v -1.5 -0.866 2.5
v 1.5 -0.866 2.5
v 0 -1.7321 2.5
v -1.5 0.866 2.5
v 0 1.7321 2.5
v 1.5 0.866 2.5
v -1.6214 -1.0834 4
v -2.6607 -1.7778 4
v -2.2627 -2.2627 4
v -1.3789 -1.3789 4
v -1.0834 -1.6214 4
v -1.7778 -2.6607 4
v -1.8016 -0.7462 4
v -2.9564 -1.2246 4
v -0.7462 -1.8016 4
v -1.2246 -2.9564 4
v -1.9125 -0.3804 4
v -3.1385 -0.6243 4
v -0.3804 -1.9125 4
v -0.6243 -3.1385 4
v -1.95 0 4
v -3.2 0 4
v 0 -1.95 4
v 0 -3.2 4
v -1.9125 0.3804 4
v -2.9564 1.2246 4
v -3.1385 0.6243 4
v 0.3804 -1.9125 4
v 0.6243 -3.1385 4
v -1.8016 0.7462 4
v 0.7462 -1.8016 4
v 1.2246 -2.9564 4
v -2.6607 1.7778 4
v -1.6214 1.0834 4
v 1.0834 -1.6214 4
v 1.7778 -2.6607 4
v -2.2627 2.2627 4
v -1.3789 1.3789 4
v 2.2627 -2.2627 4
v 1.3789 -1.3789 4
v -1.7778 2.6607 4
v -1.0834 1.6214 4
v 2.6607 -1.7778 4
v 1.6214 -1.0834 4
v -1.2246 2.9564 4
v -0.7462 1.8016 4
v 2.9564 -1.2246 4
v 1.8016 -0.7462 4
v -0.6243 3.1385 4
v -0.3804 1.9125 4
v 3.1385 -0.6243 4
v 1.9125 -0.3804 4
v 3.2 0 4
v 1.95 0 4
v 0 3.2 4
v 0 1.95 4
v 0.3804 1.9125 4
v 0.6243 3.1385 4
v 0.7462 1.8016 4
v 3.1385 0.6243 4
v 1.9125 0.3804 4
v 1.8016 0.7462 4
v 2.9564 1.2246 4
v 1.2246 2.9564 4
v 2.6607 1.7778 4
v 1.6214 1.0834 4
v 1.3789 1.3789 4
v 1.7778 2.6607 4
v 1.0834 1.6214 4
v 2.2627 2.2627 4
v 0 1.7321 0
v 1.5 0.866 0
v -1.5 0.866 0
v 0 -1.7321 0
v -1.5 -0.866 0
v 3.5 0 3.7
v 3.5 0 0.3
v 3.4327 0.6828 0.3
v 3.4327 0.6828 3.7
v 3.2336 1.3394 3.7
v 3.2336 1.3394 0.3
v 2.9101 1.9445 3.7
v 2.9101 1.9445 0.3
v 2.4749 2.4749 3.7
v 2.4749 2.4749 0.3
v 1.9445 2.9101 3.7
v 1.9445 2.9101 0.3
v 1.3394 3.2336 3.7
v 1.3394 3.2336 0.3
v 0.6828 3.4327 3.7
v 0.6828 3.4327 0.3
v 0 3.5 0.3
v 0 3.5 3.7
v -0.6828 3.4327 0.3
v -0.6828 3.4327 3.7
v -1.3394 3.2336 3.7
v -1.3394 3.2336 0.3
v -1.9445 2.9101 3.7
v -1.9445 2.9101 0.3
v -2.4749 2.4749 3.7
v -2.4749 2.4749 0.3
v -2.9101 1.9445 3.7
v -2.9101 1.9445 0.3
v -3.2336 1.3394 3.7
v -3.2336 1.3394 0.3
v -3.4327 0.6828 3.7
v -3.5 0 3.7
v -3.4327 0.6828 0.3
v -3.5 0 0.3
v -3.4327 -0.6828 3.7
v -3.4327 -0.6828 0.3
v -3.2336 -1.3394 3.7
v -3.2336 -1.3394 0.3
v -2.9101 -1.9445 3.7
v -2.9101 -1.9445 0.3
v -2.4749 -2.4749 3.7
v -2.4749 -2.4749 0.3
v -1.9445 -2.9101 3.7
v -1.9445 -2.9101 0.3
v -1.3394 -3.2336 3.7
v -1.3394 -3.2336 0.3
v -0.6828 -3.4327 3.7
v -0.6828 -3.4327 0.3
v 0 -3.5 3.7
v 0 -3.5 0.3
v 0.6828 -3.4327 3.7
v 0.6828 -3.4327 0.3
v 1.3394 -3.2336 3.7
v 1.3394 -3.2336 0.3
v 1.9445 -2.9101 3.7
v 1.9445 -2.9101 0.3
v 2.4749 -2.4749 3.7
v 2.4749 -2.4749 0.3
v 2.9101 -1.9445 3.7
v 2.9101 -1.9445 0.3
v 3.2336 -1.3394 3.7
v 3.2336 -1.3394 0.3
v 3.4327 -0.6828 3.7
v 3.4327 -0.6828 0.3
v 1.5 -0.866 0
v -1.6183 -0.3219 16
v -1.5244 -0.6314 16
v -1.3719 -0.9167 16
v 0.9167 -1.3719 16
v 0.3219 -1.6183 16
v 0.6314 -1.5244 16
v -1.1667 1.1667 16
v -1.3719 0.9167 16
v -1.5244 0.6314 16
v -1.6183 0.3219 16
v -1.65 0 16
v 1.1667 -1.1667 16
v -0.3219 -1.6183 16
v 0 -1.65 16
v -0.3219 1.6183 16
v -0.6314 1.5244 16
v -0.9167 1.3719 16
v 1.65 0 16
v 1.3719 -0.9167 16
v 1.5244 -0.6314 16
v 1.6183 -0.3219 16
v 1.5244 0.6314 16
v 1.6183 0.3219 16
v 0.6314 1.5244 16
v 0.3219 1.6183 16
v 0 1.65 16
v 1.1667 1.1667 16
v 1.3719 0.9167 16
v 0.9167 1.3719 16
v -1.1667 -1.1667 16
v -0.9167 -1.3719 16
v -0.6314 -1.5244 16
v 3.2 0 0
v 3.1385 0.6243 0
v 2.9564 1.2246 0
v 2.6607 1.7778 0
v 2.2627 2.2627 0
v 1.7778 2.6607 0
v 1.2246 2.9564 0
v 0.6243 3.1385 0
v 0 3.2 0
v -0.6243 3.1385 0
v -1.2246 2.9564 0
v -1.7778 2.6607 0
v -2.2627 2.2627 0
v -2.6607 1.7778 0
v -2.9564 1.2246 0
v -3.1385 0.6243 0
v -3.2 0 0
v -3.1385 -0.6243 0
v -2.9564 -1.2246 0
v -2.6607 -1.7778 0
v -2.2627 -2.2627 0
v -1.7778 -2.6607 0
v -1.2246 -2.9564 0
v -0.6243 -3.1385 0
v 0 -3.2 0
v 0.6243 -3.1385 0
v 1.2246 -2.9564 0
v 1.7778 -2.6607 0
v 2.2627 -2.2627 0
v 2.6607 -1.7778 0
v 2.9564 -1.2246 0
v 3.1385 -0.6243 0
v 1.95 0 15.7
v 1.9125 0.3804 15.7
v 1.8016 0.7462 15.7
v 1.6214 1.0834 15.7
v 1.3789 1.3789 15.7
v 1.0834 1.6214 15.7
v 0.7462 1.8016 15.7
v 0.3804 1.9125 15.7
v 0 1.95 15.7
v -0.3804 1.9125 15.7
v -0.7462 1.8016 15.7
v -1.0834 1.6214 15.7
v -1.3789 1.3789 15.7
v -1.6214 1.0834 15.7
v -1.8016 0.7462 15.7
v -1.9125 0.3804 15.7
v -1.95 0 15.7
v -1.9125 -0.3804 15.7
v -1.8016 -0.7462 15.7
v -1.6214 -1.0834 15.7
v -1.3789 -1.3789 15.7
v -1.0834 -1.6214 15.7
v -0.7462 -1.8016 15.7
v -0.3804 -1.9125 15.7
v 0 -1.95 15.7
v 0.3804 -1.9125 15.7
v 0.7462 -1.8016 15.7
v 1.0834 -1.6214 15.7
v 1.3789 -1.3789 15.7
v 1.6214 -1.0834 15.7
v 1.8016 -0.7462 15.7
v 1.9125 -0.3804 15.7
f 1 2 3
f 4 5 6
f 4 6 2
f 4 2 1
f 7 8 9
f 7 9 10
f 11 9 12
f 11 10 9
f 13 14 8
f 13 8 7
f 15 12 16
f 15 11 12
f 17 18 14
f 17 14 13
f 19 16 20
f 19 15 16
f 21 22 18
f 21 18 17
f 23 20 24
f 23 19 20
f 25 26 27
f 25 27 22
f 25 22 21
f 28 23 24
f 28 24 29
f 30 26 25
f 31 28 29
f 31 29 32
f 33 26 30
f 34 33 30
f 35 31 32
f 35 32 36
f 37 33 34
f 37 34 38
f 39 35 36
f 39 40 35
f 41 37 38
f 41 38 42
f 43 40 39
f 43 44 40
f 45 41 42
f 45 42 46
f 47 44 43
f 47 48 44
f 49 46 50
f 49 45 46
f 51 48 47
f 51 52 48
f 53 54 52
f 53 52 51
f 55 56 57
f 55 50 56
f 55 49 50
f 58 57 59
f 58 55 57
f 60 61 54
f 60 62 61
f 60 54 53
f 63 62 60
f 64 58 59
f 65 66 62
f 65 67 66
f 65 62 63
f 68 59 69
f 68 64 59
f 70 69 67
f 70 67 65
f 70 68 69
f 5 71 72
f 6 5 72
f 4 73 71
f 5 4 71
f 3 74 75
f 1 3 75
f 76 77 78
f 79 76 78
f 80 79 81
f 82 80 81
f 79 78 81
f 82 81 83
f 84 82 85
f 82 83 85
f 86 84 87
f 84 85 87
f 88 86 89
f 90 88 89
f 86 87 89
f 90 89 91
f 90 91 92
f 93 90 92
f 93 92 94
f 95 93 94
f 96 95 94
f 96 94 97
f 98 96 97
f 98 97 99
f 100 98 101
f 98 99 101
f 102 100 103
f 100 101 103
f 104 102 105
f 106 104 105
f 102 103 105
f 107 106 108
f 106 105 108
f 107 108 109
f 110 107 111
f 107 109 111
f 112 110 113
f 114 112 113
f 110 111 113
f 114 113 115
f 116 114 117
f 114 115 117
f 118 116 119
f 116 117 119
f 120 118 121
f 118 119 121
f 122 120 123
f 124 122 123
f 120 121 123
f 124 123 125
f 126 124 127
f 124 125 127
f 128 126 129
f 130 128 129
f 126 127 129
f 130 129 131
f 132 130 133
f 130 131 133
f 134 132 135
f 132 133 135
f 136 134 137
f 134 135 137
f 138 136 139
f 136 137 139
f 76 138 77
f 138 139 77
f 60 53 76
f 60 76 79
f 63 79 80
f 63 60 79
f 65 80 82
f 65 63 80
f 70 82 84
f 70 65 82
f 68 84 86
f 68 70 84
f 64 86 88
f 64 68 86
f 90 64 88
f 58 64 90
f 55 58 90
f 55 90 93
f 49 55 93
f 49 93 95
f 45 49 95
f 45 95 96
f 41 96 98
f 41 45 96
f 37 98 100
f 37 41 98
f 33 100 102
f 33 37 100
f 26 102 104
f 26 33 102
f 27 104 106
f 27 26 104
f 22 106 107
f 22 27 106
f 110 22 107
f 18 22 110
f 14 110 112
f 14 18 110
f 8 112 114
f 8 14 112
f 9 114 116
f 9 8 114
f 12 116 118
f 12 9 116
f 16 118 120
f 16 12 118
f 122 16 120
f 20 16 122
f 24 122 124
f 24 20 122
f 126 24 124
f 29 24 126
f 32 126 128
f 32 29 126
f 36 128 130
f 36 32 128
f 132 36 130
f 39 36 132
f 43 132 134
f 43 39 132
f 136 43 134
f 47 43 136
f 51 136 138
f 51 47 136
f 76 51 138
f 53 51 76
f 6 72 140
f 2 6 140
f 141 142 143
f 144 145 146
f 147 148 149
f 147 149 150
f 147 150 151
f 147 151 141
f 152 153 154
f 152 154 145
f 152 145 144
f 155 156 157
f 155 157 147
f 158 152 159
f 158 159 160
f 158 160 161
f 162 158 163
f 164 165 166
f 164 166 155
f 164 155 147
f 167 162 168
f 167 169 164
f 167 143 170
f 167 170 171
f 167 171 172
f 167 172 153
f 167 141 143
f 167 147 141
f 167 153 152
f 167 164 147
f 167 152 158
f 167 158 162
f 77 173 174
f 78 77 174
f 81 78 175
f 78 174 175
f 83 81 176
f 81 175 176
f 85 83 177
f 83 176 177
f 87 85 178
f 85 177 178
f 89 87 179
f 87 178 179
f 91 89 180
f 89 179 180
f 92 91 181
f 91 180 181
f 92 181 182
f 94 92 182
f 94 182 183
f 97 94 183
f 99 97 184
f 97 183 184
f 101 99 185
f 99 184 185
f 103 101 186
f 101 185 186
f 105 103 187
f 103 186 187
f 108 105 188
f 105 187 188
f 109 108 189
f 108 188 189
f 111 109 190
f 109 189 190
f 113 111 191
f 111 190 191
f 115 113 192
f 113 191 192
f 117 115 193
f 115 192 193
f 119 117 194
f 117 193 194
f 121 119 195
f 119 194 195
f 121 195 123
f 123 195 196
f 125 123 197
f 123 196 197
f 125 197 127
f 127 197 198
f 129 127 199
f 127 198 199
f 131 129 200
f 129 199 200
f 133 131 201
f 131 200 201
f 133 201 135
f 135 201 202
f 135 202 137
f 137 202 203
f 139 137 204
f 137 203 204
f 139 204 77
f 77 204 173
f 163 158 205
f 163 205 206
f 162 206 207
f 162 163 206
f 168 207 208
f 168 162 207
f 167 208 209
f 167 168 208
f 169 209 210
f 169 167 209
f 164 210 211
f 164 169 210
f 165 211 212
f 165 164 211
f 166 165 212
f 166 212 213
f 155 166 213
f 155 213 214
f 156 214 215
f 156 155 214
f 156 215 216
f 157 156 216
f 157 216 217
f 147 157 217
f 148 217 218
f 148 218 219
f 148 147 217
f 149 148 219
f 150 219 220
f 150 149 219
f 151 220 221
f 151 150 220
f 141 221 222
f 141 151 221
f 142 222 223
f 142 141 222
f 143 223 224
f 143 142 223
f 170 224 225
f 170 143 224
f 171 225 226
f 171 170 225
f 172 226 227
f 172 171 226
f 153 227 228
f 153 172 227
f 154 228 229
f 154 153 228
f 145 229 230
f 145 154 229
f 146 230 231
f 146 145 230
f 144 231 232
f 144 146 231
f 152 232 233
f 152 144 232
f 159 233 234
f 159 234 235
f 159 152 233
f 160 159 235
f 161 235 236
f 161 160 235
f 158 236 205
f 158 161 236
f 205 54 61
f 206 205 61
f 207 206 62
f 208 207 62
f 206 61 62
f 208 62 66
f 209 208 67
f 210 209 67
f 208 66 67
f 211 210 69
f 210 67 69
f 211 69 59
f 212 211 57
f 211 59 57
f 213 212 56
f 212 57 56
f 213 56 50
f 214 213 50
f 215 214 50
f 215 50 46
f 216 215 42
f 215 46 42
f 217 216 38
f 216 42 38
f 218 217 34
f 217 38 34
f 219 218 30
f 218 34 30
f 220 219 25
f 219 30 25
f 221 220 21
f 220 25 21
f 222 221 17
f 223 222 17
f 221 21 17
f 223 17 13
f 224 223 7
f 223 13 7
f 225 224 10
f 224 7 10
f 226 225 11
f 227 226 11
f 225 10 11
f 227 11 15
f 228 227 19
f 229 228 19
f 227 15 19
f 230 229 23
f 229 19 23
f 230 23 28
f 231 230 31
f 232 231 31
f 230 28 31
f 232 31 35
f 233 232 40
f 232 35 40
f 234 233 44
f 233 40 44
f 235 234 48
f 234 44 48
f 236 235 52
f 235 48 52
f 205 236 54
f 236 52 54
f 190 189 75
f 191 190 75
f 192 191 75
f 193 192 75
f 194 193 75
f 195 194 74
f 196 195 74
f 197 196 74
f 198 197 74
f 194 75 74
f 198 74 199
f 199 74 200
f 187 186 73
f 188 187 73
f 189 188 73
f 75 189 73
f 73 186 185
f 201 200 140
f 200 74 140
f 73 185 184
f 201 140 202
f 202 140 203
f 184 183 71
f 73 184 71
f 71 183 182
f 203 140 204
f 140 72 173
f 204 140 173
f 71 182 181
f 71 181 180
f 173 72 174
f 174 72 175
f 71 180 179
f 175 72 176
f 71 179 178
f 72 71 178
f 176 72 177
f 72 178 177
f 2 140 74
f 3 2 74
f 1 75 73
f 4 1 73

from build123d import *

# Parameters (mm, degrees)
SKIZZE1_R                       = 3.5
AUFSATZ_LINEAR_AUSTRAGEN1_DEPTH = 4
SKIZZE2_R                       = 1.95
AUFSATZ_LINEAR_AUSTRAGEN2_DEPTH = 12
FASE1_SIZE                      = 0.3
SCHNITT_LINEAR_AUSTRAGEN1_DEPTH = 2.5


with BuildPart() as part:
    # Skizze1 → Aufsatz-Linear austragen1 (new body)
    with BuildSketch(Plane.XY):
        Circle(SKIZZE1_R)
    extrude(amount=AUFSATZ_LINEAR_AUSTRAGEN1_DEPTH)

    # Skizze2 → Aufsatz-Linear austragen2 (add)
    with BuildSketch(Plane.XY.offset(4)):
        Circle(SKIZZE2_R)
    extrude(amount=AUFSATZ_LINEAR_AUSTRAGEN2_DEPTH)

    # Fase1
    fase1_edges = [part.edges().sort_by_distance(p)[0] for p in [
        (-3.5, 0, 0),
        (-3.5, 0, 4),
        (-1.95, 0, 16),
    ]]
    chamfer(fase1_edges, length=FASE1_SIZE)

    # Skizze3 → Schnitt-Linear austragen1 (cut)
    with BuildSketch(Plane(origin=(0, 0, 0), x_dir=(-1, 0, 0), z_dir=(0, 0, -1))):
        Polygon((1.5, 0.866025404), (0, 1.732050808), (-1.5, 0.866025404), (-1.5, -0.866025404), (0, -1.732050808), (1.5, -0.866025404), align=None)
    extrude(amount=-SCHNITT_LINEAR_AUSTRAGEN1_DEPTH, mode=Mode.SUBTRACT)


solid = part.part
